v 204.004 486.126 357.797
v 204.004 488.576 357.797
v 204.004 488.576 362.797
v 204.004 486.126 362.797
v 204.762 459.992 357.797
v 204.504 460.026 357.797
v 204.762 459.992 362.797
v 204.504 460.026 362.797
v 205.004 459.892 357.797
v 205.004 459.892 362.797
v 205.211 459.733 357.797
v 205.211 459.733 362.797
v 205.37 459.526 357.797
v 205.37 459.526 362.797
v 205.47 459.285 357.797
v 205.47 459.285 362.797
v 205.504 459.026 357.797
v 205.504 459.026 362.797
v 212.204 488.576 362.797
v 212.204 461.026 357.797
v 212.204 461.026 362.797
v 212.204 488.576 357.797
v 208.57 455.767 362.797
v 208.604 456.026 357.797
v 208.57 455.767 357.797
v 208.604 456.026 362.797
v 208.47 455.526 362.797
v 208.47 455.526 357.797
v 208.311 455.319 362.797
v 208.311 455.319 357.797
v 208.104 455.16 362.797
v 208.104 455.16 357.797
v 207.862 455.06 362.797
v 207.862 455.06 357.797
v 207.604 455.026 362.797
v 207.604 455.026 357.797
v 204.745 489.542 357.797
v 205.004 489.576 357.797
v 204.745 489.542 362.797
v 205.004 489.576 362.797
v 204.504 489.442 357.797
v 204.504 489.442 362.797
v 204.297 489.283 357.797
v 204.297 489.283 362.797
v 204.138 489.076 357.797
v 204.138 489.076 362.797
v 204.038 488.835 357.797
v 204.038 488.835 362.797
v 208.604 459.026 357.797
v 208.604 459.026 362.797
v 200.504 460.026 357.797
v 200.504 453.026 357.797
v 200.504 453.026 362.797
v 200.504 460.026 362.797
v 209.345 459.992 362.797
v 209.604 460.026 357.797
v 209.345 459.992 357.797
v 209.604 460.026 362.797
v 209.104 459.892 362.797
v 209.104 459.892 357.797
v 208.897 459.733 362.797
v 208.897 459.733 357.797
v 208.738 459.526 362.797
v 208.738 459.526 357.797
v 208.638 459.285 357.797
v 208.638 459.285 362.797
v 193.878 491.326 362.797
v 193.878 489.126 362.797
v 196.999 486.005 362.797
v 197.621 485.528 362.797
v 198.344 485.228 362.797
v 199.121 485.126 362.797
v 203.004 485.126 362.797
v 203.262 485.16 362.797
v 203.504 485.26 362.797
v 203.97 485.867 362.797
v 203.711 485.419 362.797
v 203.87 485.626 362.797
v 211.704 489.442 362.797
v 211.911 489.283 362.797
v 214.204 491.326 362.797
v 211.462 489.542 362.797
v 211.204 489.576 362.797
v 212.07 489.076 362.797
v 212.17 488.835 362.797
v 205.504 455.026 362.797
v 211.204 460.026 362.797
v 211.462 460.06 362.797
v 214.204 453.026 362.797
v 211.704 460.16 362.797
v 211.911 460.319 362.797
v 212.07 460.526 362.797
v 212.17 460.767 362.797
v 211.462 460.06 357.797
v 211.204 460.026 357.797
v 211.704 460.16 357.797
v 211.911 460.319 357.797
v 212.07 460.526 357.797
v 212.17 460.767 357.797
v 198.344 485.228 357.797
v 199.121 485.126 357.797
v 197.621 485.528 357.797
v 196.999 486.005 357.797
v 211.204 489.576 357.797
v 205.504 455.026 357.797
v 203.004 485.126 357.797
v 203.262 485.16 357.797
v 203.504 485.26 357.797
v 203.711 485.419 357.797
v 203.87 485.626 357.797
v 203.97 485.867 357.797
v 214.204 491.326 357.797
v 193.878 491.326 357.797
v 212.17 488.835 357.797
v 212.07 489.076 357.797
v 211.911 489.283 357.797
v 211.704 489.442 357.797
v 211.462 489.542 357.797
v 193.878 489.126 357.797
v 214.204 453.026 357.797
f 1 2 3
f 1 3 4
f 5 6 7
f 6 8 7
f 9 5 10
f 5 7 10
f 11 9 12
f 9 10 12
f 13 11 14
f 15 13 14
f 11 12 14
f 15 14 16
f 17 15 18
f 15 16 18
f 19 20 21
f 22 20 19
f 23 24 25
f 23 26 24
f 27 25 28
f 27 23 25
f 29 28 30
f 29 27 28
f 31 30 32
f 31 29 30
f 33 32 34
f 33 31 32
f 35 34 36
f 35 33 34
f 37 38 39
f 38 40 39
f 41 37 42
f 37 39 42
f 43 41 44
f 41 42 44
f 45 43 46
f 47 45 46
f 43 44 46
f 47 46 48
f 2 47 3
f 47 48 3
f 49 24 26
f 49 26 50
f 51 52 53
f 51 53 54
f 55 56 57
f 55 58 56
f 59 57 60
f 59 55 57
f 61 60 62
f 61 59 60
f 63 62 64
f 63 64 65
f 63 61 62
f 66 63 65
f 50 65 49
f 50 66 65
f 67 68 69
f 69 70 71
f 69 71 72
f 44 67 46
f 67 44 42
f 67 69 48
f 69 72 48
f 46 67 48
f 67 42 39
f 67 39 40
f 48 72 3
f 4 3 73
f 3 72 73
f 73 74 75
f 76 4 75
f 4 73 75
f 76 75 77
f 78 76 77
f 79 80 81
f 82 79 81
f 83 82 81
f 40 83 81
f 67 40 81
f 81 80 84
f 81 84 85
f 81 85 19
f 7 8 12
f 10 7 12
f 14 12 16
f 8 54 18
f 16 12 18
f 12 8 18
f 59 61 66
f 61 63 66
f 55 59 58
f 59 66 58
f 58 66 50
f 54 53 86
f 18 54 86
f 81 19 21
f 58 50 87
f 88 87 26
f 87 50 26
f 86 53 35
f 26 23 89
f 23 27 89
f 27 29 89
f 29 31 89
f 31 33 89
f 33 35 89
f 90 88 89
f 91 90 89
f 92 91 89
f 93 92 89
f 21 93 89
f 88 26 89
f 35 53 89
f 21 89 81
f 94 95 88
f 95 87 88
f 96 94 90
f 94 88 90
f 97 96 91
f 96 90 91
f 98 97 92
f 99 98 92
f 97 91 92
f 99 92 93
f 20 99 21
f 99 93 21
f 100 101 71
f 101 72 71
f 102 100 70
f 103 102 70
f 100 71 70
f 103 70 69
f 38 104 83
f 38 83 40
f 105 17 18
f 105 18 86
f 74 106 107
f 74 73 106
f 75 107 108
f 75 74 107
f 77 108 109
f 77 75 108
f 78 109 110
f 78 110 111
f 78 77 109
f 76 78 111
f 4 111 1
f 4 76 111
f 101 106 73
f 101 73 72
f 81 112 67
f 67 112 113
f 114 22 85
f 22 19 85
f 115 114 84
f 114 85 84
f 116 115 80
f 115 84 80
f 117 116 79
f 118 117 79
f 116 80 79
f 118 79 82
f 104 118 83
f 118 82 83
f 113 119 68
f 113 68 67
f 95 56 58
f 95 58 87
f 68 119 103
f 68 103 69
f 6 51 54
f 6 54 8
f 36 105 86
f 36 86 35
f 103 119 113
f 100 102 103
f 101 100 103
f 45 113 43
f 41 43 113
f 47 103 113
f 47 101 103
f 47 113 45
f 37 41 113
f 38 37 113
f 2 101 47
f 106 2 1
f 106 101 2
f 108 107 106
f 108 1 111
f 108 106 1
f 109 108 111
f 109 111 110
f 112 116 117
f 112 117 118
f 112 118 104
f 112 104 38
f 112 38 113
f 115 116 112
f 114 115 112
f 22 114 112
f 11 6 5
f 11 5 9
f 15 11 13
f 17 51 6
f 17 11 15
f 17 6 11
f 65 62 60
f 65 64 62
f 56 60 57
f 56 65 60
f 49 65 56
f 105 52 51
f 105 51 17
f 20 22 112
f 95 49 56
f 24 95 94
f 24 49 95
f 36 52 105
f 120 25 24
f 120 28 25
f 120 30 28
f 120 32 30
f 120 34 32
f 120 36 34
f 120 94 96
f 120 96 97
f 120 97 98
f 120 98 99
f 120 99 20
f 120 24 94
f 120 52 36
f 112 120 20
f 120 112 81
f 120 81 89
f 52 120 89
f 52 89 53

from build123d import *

# Parameters (mm, degrees)
PAD_DEPTH    = 5
FILLET_R     = 1
FILLET001_R  = 1
CHAMFER_SIZE = 4
FILLET002_R  = 3
FILLET003_R  = 1


with BuildPart() as part:
    # Sketch (on CopyPart__Feature) → Pad (new body)
    with BuildSketch(Plane(origin=(211.803644, 488.825915, 357.796851), x_dir=(-1, 0, 0), z_dir=(0, 0, 1))):
        Polygon((3.2, 28.8), (-0.4, 28.8), (-0.4, -0.75), (7.8, -0.75), (7.8, 3.7), (17.92547, 3.7), (17.92547, -2.5), (7.8, -2.5), (-2.4, -2.5), (-2.4, 35.8), (11.3, 35.8), (11.3, 28.8), (6.3, 28.8), (6.3, 33.8), (3.2, 33.8), align=None)
    extrude(amount=PAD_DEPTH)

    # Fillet
    fillet_edges = [part.edges().sort_by_distance(p)[0] for p in [
        (204.003644, 489.575915, 360.296851),
        (212.203644, 489.575915, 360.296851),
        (212.203644, 460.025915, 360.296851),
        (205.503644, 460.025915, 360.296851),
    ]]
    fillet(fillet_edges, radius=FILLET_R)

    # Fillet001
    fillet001_edges = [part.edges().sort_by_distance(p)[0] for p in [
        (208.603644, 460.025915, 360.296851),
        (208.603644, 455.025915, 360.296851),
    ]]
    fillet(fillet001_edges, radius=FILLET001_R)

    # Chamfer
    chamfer_edges = [part.edges().sort_by_distance(p)[0] for p in [
        (193.878174, 485.125915, 360.296851),
    ]]
    chamfer(chamfer_edges, length=CHAMFER_SIZE)

    # Fillet002
    fillet002_edges = [part.edges().sort_by_distance(p)[0] for p in [
        (197.878174, 485.125915, 360.296851),
    ]]
    fillet(fillet002_edges, radius=FILLET002_R)

    # Fillet003
    fillet003_edges = [part.edges().sort_by_distance(p)[0] for p in [
        (204.003644, 485.125915, 360.296851),
    ]]
    fillet(fillet003_edges, radius=FILLET003_R)


solid = part.part
